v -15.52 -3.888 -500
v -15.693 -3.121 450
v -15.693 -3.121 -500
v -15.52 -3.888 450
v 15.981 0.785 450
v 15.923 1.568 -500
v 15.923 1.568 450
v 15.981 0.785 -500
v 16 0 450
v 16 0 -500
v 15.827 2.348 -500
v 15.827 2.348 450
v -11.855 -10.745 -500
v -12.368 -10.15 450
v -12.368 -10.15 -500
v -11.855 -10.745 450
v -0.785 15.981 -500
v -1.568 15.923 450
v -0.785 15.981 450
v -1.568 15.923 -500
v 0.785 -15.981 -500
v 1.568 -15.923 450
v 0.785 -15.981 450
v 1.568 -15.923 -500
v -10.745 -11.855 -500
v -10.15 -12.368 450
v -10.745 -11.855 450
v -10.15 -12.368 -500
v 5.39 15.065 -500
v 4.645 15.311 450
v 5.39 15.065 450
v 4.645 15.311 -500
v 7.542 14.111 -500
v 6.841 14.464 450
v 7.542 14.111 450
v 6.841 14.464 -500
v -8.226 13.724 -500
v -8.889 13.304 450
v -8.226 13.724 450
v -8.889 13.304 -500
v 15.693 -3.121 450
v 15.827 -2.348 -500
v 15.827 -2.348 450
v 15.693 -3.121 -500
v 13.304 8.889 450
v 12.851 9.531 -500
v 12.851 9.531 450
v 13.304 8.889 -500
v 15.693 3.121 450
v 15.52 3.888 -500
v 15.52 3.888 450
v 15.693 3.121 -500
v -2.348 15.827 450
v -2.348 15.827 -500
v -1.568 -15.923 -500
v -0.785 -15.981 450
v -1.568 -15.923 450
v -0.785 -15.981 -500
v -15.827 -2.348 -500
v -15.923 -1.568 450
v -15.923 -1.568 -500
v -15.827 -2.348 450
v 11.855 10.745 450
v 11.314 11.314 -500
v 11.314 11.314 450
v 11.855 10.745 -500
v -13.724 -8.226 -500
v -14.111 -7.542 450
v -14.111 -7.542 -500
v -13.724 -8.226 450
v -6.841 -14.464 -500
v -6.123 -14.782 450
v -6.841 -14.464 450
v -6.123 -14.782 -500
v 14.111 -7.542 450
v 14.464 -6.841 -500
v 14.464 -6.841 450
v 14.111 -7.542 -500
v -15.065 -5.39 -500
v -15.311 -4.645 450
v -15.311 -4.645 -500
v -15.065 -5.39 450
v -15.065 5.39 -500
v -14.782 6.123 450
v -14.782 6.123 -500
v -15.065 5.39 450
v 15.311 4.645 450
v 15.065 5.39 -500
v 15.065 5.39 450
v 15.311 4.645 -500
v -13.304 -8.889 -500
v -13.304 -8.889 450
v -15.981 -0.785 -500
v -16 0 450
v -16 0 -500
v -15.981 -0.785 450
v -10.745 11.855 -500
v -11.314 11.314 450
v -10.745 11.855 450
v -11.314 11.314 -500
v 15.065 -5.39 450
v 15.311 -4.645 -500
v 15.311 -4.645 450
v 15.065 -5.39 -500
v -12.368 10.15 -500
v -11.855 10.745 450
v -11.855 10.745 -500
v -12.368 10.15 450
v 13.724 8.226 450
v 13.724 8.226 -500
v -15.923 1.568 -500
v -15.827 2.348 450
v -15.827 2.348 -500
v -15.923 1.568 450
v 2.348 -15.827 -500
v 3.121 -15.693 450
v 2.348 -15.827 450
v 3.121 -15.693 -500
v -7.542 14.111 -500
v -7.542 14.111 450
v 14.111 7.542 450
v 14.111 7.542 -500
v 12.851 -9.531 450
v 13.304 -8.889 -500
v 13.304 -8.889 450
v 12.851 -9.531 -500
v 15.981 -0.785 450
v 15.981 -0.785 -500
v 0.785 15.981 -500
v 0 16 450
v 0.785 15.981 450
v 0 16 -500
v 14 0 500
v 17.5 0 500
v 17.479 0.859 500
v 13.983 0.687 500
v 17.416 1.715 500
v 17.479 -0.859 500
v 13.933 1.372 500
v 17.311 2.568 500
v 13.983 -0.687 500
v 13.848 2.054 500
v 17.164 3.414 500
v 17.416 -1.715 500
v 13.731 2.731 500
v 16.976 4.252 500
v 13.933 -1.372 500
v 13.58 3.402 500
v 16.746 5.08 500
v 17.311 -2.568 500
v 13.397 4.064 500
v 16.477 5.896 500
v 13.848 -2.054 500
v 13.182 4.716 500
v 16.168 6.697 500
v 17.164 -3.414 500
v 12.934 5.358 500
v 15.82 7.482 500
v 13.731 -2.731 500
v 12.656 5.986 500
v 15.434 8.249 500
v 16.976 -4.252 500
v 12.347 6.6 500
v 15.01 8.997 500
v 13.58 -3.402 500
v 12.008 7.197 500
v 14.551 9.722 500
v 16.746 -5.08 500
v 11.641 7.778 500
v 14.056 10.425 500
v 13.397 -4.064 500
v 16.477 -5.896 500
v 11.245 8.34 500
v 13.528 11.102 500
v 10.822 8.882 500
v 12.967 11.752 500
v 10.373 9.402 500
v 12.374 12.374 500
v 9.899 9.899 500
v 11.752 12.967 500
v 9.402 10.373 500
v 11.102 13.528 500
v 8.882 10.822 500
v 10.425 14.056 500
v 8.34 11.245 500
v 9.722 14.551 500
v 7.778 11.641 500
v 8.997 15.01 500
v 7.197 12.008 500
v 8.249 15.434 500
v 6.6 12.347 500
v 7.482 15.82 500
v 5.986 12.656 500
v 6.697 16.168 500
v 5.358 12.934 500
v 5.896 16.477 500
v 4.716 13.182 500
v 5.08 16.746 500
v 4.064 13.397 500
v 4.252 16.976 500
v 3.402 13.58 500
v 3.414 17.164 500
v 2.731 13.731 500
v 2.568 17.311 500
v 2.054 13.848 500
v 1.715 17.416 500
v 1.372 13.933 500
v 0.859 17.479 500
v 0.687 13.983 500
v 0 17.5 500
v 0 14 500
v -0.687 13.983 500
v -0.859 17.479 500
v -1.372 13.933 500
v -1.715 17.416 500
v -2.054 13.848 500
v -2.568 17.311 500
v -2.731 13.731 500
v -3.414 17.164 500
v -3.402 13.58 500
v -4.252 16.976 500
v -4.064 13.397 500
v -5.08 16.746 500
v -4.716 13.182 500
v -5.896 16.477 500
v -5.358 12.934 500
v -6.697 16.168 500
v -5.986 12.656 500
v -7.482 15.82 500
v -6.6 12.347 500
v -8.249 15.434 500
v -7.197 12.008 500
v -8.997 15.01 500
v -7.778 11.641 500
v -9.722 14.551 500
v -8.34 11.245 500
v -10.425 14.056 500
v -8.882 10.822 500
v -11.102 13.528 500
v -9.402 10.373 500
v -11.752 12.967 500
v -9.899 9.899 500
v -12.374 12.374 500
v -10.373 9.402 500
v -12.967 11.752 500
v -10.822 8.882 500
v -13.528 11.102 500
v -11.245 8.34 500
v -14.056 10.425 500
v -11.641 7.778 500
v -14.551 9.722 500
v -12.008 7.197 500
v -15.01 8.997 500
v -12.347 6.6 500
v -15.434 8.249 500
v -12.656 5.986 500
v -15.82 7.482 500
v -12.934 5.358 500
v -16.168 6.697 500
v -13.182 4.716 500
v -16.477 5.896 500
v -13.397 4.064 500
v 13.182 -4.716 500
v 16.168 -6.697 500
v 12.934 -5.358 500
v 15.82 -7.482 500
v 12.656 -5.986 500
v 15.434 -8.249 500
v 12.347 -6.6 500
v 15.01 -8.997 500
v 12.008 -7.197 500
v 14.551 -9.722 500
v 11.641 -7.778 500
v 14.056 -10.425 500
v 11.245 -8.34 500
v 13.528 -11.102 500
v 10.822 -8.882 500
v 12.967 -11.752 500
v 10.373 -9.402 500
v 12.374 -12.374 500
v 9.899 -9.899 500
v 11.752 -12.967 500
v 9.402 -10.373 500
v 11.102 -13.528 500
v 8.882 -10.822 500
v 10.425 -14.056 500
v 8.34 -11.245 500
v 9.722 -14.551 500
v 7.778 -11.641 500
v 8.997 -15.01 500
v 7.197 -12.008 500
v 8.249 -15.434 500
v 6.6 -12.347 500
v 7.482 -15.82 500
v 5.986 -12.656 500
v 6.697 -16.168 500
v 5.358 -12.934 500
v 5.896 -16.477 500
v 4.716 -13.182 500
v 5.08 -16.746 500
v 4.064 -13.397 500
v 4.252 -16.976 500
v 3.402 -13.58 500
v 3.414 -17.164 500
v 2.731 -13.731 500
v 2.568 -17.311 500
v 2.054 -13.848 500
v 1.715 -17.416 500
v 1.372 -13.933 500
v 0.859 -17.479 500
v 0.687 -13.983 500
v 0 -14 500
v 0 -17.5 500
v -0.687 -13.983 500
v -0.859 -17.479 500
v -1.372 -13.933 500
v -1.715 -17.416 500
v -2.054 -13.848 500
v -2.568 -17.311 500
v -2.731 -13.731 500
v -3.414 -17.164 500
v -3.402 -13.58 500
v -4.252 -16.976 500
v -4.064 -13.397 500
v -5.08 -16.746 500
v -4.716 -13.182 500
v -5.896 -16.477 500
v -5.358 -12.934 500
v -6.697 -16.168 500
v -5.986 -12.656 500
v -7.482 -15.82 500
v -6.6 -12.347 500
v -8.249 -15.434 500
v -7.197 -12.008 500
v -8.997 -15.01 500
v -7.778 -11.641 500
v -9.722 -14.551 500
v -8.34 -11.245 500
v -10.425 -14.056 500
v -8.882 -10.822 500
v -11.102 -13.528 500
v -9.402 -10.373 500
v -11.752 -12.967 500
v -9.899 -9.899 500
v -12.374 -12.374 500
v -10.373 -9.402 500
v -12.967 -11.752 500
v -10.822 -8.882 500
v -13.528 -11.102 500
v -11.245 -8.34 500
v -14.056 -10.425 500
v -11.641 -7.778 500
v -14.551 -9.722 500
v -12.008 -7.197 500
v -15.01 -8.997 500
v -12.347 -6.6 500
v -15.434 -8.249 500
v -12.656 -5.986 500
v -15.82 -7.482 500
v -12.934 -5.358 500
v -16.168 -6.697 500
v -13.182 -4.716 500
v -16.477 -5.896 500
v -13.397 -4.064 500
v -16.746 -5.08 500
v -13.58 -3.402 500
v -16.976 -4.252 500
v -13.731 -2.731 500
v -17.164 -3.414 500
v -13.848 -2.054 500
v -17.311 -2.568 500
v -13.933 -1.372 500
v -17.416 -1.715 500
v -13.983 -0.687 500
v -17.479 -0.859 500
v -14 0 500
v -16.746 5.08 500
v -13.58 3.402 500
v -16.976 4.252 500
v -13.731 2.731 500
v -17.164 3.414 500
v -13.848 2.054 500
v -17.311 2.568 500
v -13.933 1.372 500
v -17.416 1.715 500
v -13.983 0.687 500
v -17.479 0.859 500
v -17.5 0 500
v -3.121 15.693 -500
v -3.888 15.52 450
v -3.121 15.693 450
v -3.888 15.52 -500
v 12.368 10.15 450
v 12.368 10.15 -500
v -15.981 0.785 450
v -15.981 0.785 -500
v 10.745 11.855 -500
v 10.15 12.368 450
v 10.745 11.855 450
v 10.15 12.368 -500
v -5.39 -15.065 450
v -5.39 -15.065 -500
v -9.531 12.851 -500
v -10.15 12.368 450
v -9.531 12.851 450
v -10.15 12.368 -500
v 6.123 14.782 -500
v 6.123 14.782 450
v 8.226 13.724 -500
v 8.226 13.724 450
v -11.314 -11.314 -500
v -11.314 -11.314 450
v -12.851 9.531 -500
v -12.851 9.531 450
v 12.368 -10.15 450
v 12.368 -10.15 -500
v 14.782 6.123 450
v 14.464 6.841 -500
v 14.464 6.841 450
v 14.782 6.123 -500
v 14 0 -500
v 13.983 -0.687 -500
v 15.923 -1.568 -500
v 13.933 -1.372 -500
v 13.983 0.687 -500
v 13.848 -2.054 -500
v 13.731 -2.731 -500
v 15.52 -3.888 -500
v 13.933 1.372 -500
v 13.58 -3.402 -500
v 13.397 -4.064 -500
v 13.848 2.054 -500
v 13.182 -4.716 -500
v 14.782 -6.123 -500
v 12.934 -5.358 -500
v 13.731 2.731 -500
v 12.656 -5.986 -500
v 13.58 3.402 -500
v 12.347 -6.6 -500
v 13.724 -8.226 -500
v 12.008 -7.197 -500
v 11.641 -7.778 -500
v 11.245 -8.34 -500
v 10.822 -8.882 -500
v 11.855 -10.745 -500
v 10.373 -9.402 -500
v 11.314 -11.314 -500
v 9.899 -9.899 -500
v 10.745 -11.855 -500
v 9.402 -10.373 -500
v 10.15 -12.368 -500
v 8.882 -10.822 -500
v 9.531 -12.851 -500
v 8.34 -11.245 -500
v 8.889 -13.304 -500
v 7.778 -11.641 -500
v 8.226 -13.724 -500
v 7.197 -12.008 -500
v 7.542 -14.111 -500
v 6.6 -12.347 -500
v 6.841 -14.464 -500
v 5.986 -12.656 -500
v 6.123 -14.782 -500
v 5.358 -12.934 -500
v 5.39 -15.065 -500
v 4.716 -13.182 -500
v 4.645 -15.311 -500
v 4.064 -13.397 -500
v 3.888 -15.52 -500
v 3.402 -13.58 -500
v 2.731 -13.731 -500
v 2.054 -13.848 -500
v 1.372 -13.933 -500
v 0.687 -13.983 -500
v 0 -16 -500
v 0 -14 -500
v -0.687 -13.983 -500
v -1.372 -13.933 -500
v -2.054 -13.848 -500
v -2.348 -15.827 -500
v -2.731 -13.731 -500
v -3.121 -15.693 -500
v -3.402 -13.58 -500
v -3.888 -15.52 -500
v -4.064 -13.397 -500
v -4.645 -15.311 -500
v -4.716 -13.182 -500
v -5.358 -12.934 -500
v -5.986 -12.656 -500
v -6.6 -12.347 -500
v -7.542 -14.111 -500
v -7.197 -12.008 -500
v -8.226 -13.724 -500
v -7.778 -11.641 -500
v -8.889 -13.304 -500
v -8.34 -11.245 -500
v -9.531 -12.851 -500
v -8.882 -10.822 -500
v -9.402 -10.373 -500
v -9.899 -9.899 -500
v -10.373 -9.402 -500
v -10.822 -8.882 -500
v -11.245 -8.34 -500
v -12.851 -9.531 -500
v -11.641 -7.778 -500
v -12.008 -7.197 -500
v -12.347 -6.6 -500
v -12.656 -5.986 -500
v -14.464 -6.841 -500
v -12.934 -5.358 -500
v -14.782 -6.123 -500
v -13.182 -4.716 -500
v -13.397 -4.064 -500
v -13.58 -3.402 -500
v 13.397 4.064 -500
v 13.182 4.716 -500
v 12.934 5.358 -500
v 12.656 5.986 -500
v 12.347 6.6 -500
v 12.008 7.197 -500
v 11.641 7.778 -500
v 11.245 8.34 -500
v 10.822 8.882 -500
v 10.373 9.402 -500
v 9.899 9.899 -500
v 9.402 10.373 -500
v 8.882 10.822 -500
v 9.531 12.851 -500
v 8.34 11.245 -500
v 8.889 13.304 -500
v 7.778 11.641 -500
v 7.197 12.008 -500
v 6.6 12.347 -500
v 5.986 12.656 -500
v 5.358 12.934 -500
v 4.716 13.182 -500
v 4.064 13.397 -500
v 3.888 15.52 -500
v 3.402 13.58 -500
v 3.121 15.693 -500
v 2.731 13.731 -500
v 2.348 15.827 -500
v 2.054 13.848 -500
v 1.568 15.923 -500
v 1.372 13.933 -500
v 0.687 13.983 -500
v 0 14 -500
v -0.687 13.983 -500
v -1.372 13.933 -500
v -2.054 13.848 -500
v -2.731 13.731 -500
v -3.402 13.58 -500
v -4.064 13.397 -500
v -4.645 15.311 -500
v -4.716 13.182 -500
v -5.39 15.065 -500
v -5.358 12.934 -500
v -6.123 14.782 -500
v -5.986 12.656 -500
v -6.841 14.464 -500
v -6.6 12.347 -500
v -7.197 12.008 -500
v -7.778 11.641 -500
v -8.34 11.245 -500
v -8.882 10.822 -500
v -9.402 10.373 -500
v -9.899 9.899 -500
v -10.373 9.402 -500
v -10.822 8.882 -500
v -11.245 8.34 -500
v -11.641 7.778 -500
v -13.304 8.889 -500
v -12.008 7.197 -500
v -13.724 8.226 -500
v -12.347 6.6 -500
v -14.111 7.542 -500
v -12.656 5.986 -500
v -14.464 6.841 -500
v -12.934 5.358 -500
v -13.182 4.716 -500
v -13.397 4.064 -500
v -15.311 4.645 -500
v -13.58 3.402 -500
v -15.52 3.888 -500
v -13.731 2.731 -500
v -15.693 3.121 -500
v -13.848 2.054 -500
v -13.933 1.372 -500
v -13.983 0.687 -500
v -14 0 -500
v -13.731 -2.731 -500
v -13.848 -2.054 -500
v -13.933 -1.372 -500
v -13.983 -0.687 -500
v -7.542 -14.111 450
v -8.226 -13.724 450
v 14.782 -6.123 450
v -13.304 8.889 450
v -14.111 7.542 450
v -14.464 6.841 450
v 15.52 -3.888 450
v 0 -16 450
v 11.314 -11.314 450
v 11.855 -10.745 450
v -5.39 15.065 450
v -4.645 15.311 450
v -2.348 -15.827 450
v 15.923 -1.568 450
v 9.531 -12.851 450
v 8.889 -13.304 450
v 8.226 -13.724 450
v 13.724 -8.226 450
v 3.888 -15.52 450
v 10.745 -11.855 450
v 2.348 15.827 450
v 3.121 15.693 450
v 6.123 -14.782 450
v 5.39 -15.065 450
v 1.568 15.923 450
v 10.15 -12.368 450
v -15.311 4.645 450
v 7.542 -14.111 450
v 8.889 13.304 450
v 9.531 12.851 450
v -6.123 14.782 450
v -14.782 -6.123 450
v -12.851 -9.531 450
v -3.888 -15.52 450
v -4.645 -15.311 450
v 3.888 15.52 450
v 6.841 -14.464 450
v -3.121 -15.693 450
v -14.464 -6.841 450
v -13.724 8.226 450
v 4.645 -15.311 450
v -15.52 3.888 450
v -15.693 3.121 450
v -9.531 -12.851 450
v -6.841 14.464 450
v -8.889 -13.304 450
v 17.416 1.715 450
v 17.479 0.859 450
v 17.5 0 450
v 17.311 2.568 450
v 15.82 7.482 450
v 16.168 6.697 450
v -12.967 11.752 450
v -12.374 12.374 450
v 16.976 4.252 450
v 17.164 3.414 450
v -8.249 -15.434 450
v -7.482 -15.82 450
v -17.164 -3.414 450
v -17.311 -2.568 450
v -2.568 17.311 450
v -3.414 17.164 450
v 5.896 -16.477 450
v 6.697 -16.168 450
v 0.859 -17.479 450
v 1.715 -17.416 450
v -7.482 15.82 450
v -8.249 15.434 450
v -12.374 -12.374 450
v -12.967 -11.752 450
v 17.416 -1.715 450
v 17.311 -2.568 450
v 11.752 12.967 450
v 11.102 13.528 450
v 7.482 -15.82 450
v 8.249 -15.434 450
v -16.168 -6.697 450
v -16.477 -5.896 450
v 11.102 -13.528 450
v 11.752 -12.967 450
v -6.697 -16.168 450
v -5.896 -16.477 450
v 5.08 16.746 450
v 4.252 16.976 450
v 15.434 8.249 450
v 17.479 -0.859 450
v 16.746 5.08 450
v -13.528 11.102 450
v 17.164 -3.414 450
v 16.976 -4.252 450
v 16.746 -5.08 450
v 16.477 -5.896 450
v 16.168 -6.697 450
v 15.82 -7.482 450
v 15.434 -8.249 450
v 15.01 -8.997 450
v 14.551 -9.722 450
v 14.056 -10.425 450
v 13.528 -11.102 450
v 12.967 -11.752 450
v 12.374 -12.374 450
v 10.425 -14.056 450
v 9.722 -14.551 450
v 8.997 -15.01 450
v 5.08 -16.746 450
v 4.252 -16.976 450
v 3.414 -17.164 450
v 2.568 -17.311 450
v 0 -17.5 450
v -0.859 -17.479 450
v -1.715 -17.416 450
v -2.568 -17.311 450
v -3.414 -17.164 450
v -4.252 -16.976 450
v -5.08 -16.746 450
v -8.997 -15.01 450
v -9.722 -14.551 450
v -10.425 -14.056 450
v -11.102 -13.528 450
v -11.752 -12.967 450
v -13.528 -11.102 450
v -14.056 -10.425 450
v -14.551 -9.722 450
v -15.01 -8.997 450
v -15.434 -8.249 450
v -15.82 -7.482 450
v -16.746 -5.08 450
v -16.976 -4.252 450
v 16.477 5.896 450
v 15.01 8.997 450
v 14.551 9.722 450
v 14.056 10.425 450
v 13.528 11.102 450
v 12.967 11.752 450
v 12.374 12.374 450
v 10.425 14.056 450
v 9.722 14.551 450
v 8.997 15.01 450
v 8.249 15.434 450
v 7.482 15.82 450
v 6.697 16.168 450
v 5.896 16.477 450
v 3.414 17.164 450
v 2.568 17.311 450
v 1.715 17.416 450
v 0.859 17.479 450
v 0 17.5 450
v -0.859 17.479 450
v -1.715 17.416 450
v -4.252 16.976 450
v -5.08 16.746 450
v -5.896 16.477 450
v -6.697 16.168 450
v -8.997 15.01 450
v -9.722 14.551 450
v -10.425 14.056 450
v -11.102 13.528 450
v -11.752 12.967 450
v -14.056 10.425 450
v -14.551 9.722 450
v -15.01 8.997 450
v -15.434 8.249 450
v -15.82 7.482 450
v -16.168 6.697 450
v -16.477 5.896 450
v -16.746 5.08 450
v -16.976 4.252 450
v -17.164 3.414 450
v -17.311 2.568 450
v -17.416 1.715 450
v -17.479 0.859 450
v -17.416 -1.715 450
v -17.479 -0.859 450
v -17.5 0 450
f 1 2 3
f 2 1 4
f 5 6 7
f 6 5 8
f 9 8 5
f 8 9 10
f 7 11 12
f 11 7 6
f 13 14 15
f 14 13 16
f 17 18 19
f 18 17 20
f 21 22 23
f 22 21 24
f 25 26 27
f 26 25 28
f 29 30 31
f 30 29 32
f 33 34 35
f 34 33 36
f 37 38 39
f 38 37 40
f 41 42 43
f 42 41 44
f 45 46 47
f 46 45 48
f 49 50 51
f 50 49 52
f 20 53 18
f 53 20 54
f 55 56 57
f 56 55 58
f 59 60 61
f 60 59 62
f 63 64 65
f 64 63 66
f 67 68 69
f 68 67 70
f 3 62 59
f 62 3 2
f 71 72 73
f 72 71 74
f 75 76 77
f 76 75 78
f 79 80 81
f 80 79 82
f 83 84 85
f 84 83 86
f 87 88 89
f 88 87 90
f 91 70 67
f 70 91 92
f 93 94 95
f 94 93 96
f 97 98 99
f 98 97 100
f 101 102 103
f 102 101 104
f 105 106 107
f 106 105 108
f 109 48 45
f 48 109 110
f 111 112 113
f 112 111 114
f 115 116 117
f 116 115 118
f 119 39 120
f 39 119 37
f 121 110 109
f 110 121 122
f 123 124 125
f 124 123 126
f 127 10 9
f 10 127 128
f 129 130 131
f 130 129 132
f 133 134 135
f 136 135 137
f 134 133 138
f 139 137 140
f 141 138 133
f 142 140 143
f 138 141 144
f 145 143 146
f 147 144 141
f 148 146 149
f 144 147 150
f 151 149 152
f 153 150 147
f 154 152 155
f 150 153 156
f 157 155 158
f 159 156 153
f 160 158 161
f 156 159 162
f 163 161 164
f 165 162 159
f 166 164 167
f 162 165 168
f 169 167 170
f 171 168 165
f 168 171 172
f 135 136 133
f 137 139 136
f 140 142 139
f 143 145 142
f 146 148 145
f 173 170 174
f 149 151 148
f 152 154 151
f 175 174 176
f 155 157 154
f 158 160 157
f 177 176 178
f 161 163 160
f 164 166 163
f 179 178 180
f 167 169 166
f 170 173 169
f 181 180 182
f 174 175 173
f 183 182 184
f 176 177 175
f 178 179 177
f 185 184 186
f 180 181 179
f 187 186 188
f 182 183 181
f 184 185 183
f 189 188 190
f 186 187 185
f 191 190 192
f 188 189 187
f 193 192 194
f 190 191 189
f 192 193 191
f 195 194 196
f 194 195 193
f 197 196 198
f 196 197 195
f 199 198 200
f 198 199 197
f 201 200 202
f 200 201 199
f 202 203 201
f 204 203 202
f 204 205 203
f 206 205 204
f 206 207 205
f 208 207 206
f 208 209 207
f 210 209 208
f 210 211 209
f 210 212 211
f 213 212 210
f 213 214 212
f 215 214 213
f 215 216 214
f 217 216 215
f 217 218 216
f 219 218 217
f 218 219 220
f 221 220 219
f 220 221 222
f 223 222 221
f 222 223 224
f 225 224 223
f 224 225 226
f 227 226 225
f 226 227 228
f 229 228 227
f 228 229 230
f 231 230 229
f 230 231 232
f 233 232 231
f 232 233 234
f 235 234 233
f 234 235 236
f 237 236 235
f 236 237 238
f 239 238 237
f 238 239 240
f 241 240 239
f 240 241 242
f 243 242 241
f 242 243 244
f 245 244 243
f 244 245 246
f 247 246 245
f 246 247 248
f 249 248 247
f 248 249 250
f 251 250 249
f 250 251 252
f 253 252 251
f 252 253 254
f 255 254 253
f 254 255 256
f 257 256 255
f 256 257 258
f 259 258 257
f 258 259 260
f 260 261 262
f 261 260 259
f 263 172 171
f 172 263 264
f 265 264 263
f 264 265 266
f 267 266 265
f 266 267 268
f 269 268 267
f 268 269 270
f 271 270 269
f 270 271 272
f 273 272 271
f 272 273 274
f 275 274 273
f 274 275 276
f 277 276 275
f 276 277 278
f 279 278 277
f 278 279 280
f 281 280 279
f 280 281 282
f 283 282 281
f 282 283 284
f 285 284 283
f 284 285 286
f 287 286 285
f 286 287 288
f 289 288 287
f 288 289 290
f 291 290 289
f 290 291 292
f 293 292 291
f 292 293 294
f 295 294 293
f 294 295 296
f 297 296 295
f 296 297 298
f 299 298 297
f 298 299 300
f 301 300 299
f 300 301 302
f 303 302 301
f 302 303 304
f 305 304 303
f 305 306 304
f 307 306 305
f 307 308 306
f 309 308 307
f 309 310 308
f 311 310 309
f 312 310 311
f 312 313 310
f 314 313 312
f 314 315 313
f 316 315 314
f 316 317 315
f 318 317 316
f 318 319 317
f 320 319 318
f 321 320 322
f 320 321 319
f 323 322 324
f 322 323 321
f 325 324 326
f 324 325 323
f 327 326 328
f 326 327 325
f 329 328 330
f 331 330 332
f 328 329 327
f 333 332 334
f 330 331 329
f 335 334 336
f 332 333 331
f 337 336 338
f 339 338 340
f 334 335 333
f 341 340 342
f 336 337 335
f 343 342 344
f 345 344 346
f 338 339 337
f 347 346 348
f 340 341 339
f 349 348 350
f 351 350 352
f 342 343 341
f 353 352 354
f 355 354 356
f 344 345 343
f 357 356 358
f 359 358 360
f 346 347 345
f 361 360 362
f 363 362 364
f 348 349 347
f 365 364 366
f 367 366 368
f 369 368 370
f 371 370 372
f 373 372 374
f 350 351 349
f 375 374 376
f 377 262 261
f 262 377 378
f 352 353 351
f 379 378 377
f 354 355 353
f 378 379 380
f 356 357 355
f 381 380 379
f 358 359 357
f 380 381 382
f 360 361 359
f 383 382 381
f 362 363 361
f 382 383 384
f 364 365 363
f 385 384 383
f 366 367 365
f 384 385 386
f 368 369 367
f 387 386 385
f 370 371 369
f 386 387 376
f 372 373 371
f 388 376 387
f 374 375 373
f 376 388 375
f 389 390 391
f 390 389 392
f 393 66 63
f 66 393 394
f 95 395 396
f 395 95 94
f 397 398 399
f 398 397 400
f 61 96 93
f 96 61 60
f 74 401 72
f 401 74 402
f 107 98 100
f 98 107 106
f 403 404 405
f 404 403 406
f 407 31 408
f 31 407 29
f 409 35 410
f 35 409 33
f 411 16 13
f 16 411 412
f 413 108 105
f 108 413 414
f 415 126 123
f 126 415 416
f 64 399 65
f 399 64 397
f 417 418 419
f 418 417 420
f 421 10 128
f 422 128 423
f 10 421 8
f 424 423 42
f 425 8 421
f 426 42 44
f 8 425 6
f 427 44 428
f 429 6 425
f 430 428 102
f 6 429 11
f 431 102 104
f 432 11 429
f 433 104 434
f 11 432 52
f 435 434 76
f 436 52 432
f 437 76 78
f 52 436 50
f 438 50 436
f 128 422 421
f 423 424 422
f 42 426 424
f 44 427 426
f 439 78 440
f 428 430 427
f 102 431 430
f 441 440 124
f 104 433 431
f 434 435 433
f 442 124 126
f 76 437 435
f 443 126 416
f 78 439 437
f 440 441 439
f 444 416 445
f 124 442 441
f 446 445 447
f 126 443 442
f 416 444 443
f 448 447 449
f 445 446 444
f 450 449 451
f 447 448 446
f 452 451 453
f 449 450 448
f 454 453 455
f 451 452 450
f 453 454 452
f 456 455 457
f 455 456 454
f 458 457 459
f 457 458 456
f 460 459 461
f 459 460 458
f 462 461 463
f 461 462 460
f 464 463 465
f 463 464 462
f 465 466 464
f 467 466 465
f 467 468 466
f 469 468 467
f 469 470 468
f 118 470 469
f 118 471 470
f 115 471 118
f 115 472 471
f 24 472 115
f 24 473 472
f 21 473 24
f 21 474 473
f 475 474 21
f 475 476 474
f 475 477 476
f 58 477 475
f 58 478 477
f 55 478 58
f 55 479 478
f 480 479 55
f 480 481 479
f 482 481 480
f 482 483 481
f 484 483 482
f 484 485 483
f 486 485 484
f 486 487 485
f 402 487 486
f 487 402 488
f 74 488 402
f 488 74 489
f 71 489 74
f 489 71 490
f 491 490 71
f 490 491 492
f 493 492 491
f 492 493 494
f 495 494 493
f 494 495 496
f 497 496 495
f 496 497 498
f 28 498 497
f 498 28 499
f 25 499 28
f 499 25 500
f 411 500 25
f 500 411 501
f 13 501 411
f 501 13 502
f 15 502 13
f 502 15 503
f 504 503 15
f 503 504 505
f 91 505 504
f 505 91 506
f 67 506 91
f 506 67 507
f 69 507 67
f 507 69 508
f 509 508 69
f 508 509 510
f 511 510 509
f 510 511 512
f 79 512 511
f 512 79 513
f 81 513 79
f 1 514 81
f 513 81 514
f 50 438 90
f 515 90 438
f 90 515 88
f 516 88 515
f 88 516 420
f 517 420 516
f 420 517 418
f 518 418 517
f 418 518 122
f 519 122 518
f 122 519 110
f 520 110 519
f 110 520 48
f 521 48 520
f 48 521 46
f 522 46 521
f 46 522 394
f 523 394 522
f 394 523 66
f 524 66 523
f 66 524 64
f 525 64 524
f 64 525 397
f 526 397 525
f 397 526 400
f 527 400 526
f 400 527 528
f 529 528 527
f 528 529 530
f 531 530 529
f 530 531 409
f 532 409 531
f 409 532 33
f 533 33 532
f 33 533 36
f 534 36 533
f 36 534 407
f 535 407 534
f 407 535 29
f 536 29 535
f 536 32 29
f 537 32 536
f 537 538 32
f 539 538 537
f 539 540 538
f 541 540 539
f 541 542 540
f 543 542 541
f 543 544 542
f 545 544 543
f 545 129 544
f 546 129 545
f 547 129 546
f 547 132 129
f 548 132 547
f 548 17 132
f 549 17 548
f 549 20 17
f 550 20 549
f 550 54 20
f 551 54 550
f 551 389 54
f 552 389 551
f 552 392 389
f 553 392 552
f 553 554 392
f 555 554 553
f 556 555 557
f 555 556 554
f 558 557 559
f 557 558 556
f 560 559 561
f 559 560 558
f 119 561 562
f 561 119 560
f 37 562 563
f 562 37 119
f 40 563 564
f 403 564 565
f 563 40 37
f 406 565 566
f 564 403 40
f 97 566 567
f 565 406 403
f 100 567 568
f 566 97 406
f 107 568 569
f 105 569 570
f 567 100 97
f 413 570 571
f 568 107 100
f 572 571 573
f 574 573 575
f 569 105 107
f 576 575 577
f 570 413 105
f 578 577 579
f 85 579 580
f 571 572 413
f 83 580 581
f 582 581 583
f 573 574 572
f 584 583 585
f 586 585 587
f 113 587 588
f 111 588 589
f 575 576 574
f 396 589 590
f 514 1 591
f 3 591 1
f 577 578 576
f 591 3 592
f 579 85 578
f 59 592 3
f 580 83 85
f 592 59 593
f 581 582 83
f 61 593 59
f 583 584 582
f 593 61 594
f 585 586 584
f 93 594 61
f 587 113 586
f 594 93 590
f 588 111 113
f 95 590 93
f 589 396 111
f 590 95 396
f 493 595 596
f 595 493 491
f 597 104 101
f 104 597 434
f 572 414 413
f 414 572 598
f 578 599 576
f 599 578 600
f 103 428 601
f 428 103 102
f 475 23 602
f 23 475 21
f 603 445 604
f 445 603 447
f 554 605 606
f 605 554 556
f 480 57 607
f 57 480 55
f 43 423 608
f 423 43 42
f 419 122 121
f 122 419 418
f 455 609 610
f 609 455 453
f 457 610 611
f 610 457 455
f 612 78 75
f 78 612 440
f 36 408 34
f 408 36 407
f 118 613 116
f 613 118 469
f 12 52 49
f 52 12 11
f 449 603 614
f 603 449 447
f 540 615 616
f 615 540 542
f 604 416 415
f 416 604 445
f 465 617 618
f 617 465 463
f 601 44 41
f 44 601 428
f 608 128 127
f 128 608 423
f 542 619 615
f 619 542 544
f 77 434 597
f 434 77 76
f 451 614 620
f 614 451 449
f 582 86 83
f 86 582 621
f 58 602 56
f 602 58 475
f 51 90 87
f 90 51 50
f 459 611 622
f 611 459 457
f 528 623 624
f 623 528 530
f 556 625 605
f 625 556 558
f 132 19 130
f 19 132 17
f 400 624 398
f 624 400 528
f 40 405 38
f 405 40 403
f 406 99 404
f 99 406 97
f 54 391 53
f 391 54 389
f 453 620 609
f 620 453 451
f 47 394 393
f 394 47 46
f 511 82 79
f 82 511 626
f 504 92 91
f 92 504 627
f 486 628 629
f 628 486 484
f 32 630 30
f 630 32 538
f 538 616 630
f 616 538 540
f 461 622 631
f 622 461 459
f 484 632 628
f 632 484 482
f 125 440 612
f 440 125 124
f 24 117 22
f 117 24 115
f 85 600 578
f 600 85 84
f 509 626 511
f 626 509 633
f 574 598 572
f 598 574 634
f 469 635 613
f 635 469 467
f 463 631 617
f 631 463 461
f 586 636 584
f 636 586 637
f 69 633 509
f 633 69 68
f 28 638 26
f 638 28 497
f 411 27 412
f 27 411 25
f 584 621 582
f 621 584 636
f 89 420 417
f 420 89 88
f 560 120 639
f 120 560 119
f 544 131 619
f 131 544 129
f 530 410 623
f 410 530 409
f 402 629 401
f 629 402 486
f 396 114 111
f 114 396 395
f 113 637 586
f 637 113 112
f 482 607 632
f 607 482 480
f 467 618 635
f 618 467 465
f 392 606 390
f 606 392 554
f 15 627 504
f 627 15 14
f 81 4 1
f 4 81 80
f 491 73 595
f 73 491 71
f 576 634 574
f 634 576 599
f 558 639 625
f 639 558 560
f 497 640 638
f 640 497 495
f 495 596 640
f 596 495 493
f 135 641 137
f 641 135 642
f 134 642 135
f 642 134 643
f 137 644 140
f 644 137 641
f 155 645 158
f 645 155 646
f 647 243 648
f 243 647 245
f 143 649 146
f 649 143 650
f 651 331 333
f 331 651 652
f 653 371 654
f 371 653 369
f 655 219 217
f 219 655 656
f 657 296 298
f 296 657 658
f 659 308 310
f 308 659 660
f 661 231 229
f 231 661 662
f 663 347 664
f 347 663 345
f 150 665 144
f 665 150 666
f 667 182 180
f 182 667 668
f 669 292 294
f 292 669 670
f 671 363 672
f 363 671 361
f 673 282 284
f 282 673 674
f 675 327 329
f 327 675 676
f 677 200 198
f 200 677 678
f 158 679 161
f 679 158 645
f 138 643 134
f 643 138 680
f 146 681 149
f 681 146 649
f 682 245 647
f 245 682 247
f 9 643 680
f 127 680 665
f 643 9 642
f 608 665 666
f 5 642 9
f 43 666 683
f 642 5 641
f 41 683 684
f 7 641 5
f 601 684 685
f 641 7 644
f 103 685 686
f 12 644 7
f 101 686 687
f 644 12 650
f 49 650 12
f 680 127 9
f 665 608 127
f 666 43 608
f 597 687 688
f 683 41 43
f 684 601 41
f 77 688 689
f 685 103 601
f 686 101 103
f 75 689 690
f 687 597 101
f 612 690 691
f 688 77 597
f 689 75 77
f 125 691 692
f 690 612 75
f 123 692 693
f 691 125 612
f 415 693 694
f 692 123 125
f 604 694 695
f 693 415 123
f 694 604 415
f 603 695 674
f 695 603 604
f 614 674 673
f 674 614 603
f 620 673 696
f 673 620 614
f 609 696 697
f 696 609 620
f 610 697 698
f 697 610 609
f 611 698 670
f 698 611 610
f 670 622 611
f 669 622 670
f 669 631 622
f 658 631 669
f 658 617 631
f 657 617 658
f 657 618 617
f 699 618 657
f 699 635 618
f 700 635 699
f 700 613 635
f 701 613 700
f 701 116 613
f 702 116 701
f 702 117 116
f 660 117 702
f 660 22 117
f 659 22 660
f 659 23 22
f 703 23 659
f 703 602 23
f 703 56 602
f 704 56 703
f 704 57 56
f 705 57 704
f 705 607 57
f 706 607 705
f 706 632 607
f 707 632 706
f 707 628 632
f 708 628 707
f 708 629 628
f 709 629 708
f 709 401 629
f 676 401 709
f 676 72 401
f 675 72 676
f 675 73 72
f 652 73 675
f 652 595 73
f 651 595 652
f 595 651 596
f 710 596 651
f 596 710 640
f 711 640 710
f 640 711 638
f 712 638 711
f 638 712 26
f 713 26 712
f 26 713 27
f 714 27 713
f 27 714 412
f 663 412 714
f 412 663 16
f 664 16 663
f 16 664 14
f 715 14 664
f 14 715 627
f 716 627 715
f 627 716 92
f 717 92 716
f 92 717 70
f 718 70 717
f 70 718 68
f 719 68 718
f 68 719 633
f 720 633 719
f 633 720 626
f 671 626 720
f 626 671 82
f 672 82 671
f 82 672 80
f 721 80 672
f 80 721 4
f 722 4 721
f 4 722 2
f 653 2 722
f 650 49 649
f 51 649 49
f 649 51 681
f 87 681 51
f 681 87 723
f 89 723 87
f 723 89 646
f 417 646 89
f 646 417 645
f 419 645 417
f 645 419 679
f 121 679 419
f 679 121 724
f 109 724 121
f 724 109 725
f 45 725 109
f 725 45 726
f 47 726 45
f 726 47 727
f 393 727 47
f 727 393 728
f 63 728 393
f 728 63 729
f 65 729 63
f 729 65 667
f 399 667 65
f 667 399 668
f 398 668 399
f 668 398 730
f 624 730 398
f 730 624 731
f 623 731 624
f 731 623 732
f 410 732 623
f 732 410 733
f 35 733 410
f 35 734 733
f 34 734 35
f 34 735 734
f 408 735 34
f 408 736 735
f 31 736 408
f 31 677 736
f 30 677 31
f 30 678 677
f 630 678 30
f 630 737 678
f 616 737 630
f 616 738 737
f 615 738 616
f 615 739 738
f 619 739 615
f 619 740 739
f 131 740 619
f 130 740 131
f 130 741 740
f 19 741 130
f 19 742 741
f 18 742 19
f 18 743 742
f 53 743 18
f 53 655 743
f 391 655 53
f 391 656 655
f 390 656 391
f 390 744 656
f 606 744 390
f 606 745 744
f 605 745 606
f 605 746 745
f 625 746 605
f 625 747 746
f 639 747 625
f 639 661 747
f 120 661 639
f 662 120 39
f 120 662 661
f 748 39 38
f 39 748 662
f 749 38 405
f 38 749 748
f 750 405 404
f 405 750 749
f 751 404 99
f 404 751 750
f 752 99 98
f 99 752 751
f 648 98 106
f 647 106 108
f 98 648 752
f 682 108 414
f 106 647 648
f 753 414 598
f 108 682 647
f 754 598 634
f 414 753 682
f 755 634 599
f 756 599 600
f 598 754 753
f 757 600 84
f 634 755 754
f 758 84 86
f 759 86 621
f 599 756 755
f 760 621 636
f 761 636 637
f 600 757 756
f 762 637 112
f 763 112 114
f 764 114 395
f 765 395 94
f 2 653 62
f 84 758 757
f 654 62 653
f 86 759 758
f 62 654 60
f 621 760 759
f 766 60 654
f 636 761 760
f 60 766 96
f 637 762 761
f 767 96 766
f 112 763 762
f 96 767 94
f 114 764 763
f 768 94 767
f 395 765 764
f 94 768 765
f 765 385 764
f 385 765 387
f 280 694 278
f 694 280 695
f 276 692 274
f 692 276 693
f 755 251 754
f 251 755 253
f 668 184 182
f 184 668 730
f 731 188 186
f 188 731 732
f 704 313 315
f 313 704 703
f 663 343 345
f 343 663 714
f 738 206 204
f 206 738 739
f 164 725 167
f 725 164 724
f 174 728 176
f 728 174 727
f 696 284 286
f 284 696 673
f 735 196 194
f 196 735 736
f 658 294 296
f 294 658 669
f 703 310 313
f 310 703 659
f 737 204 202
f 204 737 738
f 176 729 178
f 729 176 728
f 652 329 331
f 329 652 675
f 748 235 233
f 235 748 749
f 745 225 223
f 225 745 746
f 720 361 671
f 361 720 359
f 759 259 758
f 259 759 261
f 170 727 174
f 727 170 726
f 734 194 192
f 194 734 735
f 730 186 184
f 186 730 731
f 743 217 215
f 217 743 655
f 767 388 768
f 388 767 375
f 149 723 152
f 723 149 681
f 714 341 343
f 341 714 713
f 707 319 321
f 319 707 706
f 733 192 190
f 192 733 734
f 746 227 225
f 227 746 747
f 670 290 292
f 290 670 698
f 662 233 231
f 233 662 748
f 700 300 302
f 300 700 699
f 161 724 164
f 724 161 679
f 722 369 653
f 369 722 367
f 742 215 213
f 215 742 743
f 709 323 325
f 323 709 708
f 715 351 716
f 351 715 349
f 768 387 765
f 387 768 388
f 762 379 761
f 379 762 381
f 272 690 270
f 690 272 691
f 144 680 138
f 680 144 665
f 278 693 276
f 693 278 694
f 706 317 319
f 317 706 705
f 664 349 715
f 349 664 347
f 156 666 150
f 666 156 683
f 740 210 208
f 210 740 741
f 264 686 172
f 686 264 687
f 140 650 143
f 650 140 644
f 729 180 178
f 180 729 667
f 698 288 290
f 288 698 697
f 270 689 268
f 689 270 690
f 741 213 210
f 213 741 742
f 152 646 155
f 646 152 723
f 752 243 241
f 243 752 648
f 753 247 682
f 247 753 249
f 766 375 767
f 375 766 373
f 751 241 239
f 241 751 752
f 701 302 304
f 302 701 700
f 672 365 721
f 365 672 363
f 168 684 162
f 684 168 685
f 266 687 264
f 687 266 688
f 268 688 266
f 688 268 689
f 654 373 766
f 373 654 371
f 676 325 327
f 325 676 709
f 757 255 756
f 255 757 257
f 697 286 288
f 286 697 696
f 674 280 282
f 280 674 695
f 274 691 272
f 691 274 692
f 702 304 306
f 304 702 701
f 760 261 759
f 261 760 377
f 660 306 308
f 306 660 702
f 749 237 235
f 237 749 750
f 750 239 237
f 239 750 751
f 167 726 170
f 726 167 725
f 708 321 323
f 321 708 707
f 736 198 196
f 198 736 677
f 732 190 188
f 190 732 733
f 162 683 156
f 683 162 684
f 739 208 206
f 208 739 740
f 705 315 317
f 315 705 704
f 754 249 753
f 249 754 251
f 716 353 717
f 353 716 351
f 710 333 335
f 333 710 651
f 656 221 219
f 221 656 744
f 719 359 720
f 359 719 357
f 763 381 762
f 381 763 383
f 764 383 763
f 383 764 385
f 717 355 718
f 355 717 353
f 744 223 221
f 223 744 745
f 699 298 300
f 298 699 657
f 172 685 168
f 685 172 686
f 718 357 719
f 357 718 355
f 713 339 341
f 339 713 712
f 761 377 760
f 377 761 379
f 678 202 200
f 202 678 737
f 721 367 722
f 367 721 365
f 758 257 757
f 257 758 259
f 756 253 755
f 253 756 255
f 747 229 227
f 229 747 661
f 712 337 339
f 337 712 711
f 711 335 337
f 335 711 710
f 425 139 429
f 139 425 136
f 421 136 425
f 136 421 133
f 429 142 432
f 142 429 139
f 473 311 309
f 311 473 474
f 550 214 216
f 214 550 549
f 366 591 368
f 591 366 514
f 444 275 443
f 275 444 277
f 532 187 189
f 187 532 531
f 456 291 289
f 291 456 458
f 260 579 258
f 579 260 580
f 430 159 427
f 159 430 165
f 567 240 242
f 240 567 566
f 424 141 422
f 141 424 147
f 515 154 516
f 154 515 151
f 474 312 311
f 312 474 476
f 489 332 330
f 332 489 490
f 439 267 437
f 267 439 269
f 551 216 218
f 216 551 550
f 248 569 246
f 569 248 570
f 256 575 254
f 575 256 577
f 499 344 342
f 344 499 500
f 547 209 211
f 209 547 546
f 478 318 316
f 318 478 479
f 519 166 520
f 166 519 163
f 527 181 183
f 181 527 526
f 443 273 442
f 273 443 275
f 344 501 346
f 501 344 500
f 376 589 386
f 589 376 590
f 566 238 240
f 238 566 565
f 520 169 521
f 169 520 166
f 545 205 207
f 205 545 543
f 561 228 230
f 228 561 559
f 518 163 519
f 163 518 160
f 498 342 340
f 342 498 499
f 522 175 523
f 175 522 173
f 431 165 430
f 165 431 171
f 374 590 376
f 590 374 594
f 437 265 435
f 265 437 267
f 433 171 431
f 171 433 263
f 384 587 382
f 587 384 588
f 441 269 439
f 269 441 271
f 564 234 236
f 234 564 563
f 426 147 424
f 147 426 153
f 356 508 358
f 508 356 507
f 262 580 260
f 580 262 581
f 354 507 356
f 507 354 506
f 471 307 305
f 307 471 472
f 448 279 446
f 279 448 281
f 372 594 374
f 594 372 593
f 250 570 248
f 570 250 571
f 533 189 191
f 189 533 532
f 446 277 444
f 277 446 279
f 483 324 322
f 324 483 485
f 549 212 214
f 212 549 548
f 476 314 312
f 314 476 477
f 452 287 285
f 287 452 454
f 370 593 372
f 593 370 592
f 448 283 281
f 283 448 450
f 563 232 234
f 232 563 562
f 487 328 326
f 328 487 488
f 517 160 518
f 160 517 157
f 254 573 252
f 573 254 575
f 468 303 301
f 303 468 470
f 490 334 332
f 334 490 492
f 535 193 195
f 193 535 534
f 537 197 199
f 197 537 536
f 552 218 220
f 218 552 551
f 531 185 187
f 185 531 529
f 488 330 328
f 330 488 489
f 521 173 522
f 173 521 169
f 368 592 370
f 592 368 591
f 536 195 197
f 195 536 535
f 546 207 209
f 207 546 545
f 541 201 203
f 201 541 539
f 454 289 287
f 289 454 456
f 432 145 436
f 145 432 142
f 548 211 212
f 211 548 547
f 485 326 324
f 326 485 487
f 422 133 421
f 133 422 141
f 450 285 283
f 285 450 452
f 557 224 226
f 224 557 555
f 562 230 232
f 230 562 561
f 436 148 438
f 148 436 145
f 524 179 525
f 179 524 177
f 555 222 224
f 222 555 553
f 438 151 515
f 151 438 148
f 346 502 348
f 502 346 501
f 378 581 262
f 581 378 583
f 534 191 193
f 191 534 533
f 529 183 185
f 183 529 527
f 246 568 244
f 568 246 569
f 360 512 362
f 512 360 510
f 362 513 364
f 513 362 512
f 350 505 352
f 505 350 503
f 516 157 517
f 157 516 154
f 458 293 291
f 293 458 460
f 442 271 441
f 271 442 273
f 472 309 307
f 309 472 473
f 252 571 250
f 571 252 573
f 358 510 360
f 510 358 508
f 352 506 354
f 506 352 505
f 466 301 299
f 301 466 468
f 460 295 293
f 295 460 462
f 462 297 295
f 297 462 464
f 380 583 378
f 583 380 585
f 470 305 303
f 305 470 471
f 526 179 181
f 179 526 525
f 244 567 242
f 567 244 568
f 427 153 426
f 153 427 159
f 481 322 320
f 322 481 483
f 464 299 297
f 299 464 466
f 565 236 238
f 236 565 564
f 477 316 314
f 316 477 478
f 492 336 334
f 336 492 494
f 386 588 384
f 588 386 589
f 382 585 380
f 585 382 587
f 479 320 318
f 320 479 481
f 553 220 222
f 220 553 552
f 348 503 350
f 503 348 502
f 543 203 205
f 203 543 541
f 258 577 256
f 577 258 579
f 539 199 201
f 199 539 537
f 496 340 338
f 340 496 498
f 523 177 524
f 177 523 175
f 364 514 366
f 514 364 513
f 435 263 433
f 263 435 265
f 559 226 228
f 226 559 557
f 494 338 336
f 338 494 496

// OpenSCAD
// HT pipe: HT 32, length 1000 mm
// One connected solid, no floating parts, no text/labels.

$fn = 128;

// Parameters
pipe_length       = 1000;   //[500:2000:1]
outer_diameter    = 32;     //[16:64:0.5]
wall_thickness    = 2;      //[1:4:0.1]
socket_length     = 50;     //[25:100:1]
socket_wall_extra = 1.5;    //[0.5:3:0.1]
chamfer_length    = 2;      //[0.5:6:0.1]
eps               = 0.05;   // small overlap to avoid coincident faces

// Derived
R  = outer_diameter/2;
Ri = R - wall_thickness;
Rs = R + socket_wall_extra;

// Safety clamps (avoid invalid/empty geometry)
Ri_safe = max(0.1, Ri);
ch_safe = min(chamfer_length, min(pipe_length/2 - eps, socket_length/2 - eps));

module ht_pipe_32_L1000() {

    // Build as a single connected solid: (outer union) - (inner union)
    difference() {

        // OUTER SOLID (pipe + socket)
        union() {
            // Main outer cylinder, centered
            cylinder(h=pipe_length, r=R, center=true);

            // Socket outer enlargement at +Z end, connected by formula
            translate([0, 0, pipe_length/2 - socket_length/2])
                cylinder(h=socket_length, r=Rs, center=true);
        }

        // INNER VOID (bore + socket bore + end chamfers)
        union() {
            // Main bore through full length (slightly longer for clean subtraction)
            cylinder(h=pipe_length + 2*eps, r=Ri_safe, center=true);

            // Socket bore (explicit, connected)
            translate([0, 0, pipe_length/2 - socket_length/2])
                cylinder(h=socket_length + 2*eps, r=Ri_safe, center=true);

            // Male-end inner chamfer (add to void) at -Z end
            translate([0, 0, -pipe_length/2 + ch_safe/2])
                cylinder(h=ch_safe + 2*eps, r1=Ri_safe, r2=0, center=true);

            // Socket-end inner chamfer (add to void) at +Z end
            translate([0, 0,  pipe_length/2 - ch_safe/2])
                cylinder(h=ch_safe + 2*eps, r1=Ri_safe, r2=0, center=true);
        }
    }
}

ht_pipe_32_L1000();
